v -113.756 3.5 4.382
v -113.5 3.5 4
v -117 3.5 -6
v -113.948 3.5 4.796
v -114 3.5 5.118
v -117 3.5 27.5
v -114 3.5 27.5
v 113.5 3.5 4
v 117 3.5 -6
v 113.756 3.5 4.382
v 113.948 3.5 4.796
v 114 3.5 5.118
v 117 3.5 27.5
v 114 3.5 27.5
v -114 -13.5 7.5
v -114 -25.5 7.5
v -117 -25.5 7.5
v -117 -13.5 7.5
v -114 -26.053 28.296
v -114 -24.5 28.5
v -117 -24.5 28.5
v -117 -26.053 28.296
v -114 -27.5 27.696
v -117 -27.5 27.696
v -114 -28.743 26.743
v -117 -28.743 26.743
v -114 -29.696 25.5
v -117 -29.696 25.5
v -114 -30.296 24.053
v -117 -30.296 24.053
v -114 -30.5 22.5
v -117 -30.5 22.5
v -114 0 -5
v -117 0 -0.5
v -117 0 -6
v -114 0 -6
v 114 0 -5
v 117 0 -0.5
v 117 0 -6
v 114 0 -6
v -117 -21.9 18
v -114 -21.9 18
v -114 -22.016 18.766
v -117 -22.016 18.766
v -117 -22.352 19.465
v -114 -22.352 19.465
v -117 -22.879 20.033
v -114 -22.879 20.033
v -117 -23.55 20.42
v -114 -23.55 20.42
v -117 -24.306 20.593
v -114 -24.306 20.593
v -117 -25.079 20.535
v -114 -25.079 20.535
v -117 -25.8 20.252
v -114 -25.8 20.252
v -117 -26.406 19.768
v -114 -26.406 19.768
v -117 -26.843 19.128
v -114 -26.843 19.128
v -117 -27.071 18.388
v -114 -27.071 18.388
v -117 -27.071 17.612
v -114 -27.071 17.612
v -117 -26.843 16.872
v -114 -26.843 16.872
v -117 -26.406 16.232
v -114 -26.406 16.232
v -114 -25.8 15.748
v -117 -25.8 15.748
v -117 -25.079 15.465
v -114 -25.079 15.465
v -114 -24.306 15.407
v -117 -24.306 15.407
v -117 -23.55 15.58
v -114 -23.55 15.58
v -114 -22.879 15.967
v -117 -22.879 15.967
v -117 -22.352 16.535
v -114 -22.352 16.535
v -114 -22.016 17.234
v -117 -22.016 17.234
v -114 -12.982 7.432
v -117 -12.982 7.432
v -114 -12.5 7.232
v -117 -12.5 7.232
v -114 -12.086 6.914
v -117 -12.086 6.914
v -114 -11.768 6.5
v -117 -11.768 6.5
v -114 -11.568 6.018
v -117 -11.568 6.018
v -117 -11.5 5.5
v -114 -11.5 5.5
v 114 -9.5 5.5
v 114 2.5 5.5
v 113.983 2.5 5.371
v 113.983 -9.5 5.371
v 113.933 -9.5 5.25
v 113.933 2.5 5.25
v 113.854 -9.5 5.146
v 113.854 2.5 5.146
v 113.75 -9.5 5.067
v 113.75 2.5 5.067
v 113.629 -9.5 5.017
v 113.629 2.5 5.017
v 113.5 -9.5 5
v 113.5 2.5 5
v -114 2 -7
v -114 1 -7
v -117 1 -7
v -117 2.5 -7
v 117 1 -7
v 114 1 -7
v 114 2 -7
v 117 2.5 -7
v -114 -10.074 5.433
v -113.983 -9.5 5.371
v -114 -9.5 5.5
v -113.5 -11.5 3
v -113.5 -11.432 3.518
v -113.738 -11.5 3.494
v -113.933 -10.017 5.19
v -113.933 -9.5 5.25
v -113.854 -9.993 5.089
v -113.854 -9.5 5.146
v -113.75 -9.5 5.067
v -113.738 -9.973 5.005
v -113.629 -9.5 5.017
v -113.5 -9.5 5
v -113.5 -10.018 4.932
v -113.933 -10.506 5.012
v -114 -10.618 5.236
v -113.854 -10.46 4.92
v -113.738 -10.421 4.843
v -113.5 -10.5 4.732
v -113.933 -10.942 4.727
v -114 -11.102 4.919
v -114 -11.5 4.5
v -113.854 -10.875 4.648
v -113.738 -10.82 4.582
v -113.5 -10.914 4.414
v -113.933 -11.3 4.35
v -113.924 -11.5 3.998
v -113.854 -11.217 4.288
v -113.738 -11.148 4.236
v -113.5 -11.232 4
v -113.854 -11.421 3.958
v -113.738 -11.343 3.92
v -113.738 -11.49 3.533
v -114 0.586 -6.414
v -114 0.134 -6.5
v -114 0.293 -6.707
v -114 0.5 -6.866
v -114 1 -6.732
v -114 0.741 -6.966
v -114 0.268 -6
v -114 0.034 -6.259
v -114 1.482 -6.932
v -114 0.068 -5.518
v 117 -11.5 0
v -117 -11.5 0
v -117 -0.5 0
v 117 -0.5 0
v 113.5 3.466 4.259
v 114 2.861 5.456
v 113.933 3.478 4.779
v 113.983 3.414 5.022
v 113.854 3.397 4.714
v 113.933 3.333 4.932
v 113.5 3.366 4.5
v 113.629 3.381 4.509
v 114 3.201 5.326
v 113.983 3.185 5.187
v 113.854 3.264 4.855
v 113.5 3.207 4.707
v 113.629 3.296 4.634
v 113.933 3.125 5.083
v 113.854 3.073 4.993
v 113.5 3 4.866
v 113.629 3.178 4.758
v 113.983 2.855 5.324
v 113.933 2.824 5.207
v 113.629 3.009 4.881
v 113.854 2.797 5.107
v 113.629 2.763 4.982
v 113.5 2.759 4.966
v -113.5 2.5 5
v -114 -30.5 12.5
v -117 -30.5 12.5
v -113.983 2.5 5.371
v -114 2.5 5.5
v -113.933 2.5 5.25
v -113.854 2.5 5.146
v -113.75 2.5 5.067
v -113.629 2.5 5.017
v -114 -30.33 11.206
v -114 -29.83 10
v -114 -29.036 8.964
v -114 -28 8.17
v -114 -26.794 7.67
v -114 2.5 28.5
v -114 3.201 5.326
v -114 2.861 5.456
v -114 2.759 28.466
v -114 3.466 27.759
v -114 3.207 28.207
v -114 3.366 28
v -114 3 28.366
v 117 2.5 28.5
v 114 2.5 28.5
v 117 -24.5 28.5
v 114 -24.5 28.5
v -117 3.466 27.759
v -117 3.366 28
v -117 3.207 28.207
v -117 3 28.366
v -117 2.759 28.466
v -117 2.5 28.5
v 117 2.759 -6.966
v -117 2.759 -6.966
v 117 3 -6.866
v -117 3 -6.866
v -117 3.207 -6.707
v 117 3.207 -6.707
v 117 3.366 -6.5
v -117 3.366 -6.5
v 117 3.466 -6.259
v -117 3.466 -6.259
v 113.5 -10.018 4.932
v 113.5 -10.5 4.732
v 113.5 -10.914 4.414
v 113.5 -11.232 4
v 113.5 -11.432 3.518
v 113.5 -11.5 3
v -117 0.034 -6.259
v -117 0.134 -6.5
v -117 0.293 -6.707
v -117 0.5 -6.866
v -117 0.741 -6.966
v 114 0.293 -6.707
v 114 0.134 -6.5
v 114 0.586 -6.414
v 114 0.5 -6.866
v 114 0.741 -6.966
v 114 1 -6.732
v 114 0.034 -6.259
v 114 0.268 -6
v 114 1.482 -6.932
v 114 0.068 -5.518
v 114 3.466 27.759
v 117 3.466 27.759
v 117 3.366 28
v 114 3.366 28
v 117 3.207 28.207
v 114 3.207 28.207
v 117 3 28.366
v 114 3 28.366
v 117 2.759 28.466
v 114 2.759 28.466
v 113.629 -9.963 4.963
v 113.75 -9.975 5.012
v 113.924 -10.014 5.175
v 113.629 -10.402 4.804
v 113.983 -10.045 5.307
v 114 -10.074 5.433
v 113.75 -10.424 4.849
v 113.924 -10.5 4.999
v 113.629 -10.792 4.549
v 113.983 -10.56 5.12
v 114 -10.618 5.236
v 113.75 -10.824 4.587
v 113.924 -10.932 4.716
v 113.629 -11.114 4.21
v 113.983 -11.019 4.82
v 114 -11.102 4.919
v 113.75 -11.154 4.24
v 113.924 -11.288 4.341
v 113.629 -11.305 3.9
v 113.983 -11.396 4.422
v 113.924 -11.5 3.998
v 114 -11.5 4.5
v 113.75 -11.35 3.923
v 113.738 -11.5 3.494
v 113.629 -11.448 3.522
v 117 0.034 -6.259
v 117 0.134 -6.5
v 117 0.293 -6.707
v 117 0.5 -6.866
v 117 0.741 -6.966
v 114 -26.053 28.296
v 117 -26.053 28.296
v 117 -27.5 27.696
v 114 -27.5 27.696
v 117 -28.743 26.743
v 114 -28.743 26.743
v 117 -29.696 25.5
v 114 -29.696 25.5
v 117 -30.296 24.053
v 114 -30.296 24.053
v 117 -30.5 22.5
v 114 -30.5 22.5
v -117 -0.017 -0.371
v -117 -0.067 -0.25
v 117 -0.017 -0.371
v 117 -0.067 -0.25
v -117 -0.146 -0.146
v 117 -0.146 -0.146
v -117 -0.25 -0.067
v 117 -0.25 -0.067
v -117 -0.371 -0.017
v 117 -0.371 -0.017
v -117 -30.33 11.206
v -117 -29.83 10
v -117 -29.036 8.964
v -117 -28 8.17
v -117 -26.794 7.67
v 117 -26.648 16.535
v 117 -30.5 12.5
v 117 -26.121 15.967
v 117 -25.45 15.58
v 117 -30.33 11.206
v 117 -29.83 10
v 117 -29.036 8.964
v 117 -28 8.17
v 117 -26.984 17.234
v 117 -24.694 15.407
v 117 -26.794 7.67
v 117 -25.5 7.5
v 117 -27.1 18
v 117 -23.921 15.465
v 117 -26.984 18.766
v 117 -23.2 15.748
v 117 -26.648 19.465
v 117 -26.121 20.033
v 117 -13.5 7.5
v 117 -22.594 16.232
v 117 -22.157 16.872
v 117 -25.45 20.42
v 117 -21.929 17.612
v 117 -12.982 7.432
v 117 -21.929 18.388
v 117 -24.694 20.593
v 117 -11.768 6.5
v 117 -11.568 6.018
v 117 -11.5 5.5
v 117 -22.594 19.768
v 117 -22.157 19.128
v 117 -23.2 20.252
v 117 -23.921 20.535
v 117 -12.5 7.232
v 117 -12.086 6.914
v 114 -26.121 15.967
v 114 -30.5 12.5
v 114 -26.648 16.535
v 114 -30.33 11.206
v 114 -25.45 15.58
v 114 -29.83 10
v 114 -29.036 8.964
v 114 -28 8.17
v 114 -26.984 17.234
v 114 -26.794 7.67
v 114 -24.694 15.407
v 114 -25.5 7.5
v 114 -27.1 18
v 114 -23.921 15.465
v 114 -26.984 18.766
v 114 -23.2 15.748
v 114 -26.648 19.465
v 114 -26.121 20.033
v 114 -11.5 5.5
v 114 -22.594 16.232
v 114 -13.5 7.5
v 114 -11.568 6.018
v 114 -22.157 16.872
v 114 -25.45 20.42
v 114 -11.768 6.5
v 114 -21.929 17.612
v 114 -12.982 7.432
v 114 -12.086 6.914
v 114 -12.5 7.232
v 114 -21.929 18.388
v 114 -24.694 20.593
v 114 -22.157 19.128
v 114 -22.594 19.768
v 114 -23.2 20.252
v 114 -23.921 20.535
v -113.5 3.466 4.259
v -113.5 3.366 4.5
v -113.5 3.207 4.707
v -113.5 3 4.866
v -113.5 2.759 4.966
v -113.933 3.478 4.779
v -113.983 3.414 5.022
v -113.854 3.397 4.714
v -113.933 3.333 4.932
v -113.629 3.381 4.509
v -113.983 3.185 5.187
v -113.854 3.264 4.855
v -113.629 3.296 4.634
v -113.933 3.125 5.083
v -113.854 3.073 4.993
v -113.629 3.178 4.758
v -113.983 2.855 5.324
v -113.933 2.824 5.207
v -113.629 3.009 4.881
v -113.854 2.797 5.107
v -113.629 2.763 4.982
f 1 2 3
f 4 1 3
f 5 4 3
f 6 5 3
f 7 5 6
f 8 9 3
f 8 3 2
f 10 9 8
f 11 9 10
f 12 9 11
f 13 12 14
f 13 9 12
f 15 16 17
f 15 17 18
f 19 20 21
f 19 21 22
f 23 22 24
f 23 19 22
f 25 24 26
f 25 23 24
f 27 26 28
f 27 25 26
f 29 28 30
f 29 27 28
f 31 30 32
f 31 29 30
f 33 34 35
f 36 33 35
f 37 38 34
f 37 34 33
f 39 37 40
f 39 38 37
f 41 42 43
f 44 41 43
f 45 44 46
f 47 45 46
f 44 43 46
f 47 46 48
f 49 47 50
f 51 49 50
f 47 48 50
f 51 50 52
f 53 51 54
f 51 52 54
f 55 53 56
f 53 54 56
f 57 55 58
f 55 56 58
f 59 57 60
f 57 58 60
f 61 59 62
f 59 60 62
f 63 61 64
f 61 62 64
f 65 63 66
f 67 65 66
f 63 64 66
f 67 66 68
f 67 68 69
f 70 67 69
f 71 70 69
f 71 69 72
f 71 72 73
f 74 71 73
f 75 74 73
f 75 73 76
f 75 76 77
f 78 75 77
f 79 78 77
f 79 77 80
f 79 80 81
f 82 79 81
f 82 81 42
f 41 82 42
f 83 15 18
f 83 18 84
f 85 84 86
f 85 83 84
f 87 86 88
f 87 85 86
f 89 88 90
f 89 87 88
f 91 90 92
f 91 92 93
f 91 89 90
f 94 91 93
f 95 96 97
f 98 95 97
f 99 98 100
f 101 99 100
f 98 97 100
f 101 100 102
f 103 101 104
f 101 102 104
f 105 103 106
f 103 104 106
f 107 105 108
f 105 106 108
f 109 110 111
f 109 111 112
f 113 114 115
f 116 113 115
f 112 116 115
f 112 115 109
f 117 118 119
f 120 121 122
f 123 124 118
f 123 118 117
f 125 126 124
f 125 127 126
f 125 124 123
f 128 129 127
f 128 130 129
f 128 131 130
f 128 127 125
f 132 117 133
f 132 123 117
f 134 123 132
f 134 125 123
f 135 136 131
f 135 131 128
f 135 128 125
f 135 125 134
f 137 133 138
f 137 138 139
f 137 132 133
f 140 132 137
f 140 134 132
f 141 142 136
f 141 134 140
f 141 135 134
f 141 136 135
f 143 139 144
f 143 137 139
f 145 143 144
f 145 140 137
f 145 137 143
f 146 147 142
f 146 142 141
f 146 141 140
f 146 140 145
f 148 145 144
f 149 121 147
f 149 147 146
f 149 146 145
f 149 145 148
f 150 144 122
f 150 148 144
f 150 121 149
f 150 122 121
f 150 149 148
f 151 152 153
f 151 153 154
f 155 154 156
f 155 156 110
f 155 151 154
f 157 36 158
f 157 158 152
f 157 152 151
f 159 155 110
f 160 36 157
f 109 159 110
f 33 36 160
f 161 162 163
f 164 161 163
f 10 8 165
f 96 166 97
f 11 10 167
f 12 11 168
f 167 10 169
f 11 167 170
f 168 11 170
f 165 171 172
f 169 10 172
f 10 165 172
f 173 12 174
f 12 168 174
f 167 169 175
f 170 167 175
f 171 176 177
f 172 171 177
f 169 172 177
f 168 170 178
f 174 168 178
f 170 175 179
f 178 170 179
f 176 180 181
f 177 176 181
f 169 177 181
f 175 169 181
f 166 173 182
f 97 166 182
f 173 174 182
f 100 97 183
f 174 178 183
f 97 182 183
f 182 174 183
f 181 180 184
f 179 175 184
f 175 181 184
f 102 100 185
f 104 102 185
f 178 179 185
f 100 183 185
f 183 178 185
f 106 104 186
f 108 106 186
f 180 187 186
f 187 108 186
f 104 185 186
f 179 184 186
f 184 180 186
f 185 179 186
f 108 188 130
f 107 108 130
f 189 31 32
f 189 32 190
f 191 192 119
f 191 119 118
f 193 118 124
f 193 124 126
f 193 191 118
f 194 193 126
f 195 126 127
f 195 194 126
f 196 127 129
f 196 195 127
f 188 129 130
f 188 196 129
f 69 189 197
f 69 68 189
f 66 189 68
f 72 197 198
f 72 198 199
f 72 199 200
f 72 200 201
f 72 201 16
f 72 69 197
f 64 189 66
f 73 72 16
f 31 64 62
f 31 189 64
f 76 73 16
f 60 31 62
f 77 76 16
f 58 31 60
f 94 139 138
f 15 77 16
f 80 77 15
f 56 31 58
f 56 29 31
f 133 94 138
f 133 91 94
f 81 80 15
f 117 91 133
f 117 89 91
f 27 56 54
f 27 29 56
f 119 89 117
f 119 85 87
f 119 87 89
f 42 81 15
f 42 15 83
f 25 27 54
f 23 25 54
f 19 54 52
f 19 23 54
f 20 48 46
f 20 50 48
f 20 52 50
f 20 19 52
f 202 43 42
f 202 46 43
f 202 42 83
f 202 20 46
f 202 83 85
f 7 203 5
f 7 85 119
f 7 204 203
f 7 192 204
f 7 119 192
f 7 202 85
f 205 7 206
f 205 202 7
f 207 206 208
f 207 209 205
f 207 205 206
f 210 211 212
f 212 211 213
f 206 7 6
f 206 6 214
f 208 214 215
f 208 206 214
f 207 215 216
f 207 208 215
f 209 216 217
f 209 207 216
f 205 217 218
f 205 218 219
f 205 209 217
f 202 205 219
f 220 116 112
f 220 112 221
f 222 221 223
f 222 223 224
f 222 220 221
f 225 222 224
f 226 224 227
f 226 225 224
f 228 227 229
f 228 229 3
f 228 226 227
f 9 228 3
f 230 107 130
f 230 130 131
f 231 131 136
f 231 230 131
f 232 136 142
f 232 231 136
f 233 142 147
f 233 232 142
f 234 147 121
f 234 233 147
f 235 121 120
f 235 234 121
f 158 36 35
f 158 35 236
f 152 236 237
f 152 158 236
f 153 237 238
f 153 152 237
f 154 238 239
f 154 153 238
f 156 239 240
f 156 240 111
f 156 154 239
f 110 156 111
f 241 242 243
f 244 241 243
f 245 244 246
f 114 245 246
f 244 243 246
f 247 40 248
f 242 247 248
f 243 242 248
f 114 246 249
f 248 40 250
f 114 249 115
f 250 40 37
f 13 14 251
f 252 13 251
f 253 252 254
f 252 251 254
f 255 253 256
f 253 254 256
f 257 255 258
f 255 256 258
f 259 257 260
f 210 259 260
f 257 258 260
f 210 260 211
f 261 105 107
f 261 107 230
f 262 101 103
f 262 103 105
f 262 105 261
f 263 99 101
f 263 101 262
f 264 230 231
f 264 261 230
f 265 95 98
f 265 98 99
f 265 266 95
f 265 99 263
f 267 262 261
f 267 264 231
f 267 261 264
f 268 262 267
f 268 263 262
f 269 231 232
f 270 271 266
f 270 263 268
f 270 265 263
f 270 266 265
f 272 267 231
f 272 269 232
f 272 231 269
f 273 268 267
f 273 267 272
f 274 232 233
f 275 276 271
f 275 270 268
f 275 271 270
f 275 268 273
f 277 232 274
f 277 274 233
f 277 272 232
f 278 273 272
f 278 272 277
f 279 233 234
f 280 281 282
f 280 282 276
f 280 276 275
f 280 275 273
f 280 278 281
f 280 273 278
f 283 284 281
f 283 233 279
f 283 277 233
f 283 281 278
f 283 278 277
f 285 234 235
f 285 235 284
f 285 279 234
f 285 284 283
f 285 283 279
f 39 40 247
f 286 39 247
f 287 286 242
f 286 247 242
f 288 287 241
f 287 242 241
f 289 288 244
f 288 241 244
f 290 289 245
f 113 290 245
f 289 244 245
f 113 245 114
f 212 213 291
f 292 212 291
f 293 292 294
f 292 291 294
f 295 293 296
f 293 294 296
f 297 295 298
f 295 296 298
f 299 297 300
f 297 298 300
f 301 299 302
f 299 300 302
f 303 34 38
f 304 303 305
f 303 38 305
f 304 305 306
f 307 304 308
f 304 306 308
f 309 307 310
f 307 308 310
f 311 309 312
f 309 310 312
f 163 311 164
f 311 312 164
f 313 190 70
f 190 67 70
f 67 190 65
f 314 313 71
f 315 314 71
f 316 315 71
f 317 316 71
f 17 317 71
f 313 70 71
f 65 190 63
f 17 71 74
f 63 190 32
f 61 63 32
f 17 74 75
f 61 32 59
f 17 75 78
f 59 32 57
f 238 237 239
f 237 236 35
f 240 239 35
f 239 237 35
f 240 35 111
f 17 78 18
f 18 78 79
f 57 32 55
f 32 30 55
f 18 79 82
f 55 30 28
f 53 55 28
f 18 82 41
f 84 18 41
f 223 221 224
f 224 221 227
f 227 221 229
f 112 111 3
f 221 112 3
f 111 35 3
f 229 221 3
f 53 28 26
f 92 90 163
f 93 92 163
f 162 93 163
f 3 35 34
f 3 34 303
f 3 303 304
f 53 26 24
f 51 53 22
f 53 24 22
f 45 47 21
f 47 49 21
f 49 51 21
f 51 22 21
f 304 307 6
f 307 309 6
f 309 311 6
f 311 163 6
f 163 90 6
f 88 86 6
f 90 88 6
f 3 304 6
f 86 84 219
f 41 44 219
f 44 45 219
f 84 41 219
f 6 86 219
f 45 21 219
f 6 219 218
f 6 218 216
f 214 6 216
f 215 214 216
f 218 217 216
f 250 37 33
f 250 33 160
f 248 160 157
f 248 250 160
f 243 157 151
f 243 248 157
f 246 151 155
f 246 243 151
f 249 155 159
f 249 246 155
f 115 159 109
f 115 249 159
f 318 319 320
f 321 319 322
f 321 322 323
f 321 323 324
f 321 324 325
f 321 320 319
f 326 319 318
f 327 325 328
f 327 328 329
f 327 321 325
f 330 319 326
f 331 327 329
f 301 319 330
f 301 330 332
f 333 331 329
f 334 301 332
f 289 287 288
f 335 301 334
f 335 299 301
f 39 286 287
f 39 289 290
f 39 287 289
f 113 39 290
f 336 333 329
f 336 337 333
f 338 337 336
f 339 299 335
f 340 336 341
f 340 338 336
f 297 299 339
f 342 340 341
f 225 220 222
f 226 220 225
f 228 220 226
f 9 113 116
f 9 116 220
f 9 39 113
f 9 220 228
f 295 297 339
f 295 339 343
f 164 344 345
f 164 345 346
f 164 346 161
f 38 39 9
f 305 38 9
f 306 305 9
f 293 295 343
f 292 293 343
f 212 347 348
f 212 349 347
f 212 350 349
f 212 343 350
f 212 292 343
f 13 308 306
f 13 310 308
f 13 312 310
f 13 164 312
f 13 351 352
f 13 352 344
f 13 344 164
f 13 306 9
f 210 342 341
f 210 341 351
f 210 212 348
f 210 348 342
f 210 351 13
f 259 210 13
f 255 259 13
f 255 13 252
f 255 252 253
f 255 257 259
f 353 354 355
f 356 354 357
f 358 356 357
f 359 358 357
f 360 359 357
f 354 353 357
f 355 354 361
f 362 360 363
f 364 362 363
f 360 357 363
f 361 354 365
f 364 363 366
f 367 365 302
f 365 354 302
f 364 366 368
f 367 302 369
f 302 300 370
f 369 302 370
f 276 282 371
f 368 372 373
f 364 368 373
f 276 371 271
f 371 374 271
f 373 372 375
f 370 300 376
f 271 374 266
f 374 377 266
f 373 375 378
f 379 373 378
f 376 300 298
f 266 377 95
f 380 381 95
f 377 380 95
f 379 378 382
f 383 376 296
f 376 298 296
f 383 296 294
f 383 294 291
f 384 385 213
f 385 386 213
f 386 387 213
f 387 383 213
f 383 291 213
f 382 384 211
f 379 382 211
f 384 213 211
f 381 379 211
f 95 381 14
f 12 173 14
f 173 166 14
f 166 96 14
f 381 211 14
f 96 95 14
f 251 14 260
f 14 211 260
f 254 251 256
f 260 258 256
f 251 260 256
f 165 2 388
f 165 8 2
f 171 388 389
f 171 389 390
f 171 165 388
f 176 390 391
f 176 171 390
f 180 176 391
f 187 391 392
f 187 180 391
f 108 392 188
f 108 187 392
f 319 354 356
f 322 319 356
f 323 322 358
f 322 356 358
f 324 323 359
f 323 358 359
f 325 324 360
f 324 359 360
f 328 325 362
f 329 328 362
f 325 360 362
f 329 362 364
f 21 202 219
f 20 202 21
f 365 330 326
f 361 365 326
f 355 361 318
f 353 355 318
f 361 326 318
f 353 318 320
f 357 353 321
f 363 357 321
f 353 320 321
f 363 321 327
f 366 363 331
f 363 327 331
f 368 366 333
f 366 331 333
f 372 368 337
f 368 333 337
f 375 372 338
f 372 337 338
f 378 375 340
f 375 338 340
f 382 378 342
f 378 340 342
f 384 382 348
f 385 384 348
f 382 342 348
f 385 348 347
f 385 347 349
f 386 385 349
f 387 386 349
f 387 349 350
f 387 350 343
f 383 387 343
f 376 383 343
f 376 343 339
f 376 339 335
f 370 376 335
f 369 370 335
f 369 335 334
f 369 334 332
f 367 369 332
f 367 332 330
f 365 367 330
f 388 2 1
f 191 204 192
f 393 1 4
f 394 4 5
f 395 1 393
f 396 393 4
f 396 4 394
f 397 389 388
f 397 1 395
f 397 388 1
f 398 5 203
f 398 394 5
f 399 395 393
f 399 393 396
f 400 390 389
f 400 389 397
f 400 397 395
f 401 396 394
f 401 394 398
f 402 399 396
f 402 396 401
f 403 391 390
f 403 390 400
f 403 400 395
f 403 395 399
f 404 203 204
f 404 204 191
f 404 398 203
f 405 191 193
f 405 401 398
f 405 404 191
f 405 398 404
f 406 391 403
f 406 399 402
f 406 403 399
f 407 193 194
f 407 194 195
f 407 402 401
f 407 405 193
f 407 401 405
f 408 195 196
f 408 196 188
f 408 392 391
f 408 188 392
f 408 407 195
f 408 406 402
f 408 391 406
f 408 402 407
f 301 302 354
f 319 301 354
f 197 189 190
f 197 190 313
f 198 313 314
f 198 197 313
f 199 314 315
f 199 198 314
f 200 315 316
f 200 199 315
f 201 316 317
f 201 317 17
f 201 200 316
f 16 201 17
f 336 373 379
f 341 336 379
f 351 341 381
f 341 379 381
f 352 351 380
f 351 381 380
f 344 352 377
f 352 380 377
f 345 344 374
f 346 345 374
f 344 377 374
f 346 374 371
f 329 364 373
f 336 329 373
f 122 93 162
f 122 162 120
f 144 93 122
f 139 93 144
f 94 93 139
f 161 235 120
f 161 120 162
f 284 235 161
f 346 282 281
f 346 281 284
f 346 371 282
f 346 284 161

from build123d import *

# Parameters (mm, degrees)
F1_DEPTH     = 114
F3_DEPTH     = 3
F5_R         = 0.5
F6_D         = 5.2
F6_DEPTH     = 231.001
F7_D         = 5.2
F8_T1_DEPTH  = 12
F8_T6_ANGLE  = 161.6484946187
F8_T11_ANGLE = 150.9012204259
F8_T16_ANGLE = 150.9012204259
F8_T21_ANGLE = 161.6484946187


# Not quite as in the source:
# - a fillet or chamfer that OpenCascade refuses, or shapes differently, is made with other operations: its cross-section is extruded or revolved along the edge and cut away or added


with BuildPart() as f1:
    # F0 (on Right) → F1 (new body, symmetric)
    with BuildSketch(Plane.YZ):
        with BuildLine():
            Line((2.5, 5), (-9.5, 5))
            ThreePointArc((-9.5, 5), (-10.9142135624, 4.4142135624), (-11.5, 3))
            Line((-11.5, 3), (-11.5, 0))
            Line((-11.5, 0), (0, 0))
            Line((0, 0), (3.5, 0))
            Line((3.5, 0), (3.5, 4))
            ThreePointArc((3.5, 4), (3.2071067812, 4.7071067812), (2.5, 5))
        make_face()
        with BuildLine():
            Line((3.5, -6), (3.5, 0))
            Line((3.5, 0), (0, 0))
            Line((0, 0), (0, -5))
            ThreePointArc((0, -5), (0.5857864376, -6.4142135624), (2, -7))
            Line((2, -7), (2.5, -7))
            ThreePointArc((2.5, -7), (3.2071067812, -6.7071067812), (3.5, -6))
        make_face()
    extrude(amount=F1_DEPTH, both=True)

    # F2 (on face) → F3 (join)
    with BuildSketch(Plane.YZ.offset(114)):
        with BuildLine():
            Line((2.5, 28.5), (-24.5, 28.5))
            ThreePointArc((-24.5, 28.5), (-28.7426406871, 26.7426406871), (-30.5, 22.5))
            Line((-30.5, 22.5), (-30.5, 12.5))
            ThreePointArc((-30.5, 12.5), (-29.0355339059, 8.9644660941), (-25.5, 7.5))
            Line((-25.5, 7.5), (-13.5, 7.5))
            ThreePointArc((-13.5, 7.5), (-12.0857864376, 6.9142135624), (-11.5, 5.5))
            Line((-11.5, 5.5), (-11.5, 0))
            Line((-11.5, 0), (0, 0))
            Line((0, 0), (0, -6))
            ThreePointArc((0, -6), (0.2928932188, -6.7071067812), (1, -7))
            Line((1, -7), (2.5, -7))
            ThreePointArc((2.5, -7), (3.2071067812, -6.7071067812), (3.5, -6))
            Line((3.5, -6), (3.5, 7.5))
            Line((3.5, 7.5), (3.5, 27.5))
            ThreePointArc((3.5, 27.5), (3.2071067812, 28.2071067812), (2.5, 28.5))
        make_face()
    extrude(amount=F3_DEPTH)

    # F4: F1 across plane


with BuildPart() as f1_1:
    add(f1.part)
    add(f1.part.mirror(Plane.YZ))

    # F5
    f5_edges = [f1_1.edges().sort_by_distance(p)[0] for p in [
        (0, 0, 0),
    ]]
    fillet(f5_edges, radius=F5_R)

    # F6 (through all, one way)
    with BuildSketch(Plane.YZ.offset(114)):
        with Locations((-24.5, 18)):
            Circle(F6_D / 2)
    extrude(amount=-F6_DEPTH, mode=Mode.SUBTRACT)

    # F7 (through all)
    with Locations(Plane(origin=(114, 0, 0), x_dir=(0, 1, 0), z_dir=(-1, 0, 0))):
        with Locations((-24.5, -18)):
            Hole(F7_D / 2)

    # F8: fillet of radius 0.5 on 6 edges, made by hand

    # F8_s2 → F8_t1 (join)
    with BuildSketch(Plane.XZ.offset(-2.5)):
        with BuildLine():
            ThreePointArc((-114, 5.5), (-113.8535533906, 5.1464466094), (-113.5, 5))
            Line((-113.5, 5), (-114, 5))
            Line((-114, 5), (-114, 5.5))
        make_face()
        with BuildLine():
            ThreePointArc((114, 5.5), (113.8535533906, 5.1464466094), (113.5, 5))
            Line((113.5, 5), (114, 5))
            Line((114, 5), (114, 5.5))
        make_face()
    extrude(amount=F8_T1_DEPTH)


with BuildPart() as f8_tool4:
    # F8_s5 → F8_t6 (revolve)
    with BuildSketch(Plane(origin=(0, 3.4475148544, 1.1435956184), x_dir=(1, 0, 0), z_dir=(0, -0.9491428342, -0.3148458041))):
        with BuildLine():
            ThreePointArc((-114, 1.5094568264), (-113.8535533906, 1.863010217), (-113.5, 2.0094568264))
            Line((-113.5, 2.0094568264), (-114, 2.0094568264))
            Line((-114, 2.0094568264), (-114, 1.5094568264))
        make_face()
    revolve(axis=Axis((-114, 2.5, 4), (1, 0, 0)), revolution_arc=F8_T6_ANGLE)

    split(bisect_by=Plane.XZ.offset(-3.5), keep=Keep.TOP)


with BuildPart() as f1_2:
    add(f1_1.part)

    # F8_t3: union F8_tool4
    add(f8_tool4.part)


with BuildPart() as f8_tool9:
    # F8_s10 → F8_t11 (revolve)
    with BuildSketch(Plane.XZ.offset(9.5)):
        with BuildLine():
            ThreePointArc((-114, 5.5), (-113.8535533906, 5.1464466094), (-113.5, 5))
            Line((-113.5, 5), (-114, 5))
            Line((-114, 5), (-114, 5.5))
        make_face()
    revolve(axis=Axis((-114, -9.5, 3), (1, 0, 0)), revolution_arc=F8_T11_ANGLE)

    split(bisect_by=Plane.XZ.offset(11.5), keep=Keep.BOTTOM)


with BuildPart() as f1_3:
    add(f1_2.part)

    # F8_t8: union F8_tool9
    add(f8_tool9.part)


with BuildPart() as f8_tool14:
    # F8_s15 → F8_t16 (revolve)
    with BuildSketch(Plane.XZ.offset(9.5)):
        with BuildLine():
            ThreePointArc((113.5, 5), (113.8535533906, 5.1464466094), (114, 5.5))
            Line((114, 5.5), (114, 5))
            Line((114, 5), (113.5, 5))
        make_face()
    revolve(axis=Axis((114, -9.5, 3), (1, 0, 0)), revolution_arc=F8_T16_ANGLE)

    split(bisect_by=Plane.XZ.offset(11.5), keep=Keep.BOTTOM)


with BuildPart() as f1_4:
    add(f1_3.part)

    # F8_t13: union F8_tool14
    add(f8_tool14.part)


with BuildPart() as f8_tool19:
    # F8_s20 → F8_t21 (revolve)
    with BuildSketch(Plane(origin=(0, 3.4475148544, 1.1435956184), x_dir=(1, 0, 0), z_dir=(0, -0.9491428342, -0.3148458041))):
        with BuildLine():
            ThreePointArc((114, 1.5094568264), (113.8535533906, 1.863010217), (113.5, 2.0094568264))
            Line((113.5, 2.0094568264), (114, 2.0094568264))
            Line((114, 2.0094568264), (114, 1.5094568264))
        make_face()
    revolve(axis=Axis((114, 2.5, 4), (1, 0, 0)), revolution_arc=F8_T21_ANGLE)

    split(bisect_by=Plane.XZ.offset(-3.5), keep=Keep.TOP)


with BuildPart() as f1_5:
    add(f1_4.part)

    # F8_t18: union F8_tool19
    add(f8_tool19.part)


solid = f1_5.part
